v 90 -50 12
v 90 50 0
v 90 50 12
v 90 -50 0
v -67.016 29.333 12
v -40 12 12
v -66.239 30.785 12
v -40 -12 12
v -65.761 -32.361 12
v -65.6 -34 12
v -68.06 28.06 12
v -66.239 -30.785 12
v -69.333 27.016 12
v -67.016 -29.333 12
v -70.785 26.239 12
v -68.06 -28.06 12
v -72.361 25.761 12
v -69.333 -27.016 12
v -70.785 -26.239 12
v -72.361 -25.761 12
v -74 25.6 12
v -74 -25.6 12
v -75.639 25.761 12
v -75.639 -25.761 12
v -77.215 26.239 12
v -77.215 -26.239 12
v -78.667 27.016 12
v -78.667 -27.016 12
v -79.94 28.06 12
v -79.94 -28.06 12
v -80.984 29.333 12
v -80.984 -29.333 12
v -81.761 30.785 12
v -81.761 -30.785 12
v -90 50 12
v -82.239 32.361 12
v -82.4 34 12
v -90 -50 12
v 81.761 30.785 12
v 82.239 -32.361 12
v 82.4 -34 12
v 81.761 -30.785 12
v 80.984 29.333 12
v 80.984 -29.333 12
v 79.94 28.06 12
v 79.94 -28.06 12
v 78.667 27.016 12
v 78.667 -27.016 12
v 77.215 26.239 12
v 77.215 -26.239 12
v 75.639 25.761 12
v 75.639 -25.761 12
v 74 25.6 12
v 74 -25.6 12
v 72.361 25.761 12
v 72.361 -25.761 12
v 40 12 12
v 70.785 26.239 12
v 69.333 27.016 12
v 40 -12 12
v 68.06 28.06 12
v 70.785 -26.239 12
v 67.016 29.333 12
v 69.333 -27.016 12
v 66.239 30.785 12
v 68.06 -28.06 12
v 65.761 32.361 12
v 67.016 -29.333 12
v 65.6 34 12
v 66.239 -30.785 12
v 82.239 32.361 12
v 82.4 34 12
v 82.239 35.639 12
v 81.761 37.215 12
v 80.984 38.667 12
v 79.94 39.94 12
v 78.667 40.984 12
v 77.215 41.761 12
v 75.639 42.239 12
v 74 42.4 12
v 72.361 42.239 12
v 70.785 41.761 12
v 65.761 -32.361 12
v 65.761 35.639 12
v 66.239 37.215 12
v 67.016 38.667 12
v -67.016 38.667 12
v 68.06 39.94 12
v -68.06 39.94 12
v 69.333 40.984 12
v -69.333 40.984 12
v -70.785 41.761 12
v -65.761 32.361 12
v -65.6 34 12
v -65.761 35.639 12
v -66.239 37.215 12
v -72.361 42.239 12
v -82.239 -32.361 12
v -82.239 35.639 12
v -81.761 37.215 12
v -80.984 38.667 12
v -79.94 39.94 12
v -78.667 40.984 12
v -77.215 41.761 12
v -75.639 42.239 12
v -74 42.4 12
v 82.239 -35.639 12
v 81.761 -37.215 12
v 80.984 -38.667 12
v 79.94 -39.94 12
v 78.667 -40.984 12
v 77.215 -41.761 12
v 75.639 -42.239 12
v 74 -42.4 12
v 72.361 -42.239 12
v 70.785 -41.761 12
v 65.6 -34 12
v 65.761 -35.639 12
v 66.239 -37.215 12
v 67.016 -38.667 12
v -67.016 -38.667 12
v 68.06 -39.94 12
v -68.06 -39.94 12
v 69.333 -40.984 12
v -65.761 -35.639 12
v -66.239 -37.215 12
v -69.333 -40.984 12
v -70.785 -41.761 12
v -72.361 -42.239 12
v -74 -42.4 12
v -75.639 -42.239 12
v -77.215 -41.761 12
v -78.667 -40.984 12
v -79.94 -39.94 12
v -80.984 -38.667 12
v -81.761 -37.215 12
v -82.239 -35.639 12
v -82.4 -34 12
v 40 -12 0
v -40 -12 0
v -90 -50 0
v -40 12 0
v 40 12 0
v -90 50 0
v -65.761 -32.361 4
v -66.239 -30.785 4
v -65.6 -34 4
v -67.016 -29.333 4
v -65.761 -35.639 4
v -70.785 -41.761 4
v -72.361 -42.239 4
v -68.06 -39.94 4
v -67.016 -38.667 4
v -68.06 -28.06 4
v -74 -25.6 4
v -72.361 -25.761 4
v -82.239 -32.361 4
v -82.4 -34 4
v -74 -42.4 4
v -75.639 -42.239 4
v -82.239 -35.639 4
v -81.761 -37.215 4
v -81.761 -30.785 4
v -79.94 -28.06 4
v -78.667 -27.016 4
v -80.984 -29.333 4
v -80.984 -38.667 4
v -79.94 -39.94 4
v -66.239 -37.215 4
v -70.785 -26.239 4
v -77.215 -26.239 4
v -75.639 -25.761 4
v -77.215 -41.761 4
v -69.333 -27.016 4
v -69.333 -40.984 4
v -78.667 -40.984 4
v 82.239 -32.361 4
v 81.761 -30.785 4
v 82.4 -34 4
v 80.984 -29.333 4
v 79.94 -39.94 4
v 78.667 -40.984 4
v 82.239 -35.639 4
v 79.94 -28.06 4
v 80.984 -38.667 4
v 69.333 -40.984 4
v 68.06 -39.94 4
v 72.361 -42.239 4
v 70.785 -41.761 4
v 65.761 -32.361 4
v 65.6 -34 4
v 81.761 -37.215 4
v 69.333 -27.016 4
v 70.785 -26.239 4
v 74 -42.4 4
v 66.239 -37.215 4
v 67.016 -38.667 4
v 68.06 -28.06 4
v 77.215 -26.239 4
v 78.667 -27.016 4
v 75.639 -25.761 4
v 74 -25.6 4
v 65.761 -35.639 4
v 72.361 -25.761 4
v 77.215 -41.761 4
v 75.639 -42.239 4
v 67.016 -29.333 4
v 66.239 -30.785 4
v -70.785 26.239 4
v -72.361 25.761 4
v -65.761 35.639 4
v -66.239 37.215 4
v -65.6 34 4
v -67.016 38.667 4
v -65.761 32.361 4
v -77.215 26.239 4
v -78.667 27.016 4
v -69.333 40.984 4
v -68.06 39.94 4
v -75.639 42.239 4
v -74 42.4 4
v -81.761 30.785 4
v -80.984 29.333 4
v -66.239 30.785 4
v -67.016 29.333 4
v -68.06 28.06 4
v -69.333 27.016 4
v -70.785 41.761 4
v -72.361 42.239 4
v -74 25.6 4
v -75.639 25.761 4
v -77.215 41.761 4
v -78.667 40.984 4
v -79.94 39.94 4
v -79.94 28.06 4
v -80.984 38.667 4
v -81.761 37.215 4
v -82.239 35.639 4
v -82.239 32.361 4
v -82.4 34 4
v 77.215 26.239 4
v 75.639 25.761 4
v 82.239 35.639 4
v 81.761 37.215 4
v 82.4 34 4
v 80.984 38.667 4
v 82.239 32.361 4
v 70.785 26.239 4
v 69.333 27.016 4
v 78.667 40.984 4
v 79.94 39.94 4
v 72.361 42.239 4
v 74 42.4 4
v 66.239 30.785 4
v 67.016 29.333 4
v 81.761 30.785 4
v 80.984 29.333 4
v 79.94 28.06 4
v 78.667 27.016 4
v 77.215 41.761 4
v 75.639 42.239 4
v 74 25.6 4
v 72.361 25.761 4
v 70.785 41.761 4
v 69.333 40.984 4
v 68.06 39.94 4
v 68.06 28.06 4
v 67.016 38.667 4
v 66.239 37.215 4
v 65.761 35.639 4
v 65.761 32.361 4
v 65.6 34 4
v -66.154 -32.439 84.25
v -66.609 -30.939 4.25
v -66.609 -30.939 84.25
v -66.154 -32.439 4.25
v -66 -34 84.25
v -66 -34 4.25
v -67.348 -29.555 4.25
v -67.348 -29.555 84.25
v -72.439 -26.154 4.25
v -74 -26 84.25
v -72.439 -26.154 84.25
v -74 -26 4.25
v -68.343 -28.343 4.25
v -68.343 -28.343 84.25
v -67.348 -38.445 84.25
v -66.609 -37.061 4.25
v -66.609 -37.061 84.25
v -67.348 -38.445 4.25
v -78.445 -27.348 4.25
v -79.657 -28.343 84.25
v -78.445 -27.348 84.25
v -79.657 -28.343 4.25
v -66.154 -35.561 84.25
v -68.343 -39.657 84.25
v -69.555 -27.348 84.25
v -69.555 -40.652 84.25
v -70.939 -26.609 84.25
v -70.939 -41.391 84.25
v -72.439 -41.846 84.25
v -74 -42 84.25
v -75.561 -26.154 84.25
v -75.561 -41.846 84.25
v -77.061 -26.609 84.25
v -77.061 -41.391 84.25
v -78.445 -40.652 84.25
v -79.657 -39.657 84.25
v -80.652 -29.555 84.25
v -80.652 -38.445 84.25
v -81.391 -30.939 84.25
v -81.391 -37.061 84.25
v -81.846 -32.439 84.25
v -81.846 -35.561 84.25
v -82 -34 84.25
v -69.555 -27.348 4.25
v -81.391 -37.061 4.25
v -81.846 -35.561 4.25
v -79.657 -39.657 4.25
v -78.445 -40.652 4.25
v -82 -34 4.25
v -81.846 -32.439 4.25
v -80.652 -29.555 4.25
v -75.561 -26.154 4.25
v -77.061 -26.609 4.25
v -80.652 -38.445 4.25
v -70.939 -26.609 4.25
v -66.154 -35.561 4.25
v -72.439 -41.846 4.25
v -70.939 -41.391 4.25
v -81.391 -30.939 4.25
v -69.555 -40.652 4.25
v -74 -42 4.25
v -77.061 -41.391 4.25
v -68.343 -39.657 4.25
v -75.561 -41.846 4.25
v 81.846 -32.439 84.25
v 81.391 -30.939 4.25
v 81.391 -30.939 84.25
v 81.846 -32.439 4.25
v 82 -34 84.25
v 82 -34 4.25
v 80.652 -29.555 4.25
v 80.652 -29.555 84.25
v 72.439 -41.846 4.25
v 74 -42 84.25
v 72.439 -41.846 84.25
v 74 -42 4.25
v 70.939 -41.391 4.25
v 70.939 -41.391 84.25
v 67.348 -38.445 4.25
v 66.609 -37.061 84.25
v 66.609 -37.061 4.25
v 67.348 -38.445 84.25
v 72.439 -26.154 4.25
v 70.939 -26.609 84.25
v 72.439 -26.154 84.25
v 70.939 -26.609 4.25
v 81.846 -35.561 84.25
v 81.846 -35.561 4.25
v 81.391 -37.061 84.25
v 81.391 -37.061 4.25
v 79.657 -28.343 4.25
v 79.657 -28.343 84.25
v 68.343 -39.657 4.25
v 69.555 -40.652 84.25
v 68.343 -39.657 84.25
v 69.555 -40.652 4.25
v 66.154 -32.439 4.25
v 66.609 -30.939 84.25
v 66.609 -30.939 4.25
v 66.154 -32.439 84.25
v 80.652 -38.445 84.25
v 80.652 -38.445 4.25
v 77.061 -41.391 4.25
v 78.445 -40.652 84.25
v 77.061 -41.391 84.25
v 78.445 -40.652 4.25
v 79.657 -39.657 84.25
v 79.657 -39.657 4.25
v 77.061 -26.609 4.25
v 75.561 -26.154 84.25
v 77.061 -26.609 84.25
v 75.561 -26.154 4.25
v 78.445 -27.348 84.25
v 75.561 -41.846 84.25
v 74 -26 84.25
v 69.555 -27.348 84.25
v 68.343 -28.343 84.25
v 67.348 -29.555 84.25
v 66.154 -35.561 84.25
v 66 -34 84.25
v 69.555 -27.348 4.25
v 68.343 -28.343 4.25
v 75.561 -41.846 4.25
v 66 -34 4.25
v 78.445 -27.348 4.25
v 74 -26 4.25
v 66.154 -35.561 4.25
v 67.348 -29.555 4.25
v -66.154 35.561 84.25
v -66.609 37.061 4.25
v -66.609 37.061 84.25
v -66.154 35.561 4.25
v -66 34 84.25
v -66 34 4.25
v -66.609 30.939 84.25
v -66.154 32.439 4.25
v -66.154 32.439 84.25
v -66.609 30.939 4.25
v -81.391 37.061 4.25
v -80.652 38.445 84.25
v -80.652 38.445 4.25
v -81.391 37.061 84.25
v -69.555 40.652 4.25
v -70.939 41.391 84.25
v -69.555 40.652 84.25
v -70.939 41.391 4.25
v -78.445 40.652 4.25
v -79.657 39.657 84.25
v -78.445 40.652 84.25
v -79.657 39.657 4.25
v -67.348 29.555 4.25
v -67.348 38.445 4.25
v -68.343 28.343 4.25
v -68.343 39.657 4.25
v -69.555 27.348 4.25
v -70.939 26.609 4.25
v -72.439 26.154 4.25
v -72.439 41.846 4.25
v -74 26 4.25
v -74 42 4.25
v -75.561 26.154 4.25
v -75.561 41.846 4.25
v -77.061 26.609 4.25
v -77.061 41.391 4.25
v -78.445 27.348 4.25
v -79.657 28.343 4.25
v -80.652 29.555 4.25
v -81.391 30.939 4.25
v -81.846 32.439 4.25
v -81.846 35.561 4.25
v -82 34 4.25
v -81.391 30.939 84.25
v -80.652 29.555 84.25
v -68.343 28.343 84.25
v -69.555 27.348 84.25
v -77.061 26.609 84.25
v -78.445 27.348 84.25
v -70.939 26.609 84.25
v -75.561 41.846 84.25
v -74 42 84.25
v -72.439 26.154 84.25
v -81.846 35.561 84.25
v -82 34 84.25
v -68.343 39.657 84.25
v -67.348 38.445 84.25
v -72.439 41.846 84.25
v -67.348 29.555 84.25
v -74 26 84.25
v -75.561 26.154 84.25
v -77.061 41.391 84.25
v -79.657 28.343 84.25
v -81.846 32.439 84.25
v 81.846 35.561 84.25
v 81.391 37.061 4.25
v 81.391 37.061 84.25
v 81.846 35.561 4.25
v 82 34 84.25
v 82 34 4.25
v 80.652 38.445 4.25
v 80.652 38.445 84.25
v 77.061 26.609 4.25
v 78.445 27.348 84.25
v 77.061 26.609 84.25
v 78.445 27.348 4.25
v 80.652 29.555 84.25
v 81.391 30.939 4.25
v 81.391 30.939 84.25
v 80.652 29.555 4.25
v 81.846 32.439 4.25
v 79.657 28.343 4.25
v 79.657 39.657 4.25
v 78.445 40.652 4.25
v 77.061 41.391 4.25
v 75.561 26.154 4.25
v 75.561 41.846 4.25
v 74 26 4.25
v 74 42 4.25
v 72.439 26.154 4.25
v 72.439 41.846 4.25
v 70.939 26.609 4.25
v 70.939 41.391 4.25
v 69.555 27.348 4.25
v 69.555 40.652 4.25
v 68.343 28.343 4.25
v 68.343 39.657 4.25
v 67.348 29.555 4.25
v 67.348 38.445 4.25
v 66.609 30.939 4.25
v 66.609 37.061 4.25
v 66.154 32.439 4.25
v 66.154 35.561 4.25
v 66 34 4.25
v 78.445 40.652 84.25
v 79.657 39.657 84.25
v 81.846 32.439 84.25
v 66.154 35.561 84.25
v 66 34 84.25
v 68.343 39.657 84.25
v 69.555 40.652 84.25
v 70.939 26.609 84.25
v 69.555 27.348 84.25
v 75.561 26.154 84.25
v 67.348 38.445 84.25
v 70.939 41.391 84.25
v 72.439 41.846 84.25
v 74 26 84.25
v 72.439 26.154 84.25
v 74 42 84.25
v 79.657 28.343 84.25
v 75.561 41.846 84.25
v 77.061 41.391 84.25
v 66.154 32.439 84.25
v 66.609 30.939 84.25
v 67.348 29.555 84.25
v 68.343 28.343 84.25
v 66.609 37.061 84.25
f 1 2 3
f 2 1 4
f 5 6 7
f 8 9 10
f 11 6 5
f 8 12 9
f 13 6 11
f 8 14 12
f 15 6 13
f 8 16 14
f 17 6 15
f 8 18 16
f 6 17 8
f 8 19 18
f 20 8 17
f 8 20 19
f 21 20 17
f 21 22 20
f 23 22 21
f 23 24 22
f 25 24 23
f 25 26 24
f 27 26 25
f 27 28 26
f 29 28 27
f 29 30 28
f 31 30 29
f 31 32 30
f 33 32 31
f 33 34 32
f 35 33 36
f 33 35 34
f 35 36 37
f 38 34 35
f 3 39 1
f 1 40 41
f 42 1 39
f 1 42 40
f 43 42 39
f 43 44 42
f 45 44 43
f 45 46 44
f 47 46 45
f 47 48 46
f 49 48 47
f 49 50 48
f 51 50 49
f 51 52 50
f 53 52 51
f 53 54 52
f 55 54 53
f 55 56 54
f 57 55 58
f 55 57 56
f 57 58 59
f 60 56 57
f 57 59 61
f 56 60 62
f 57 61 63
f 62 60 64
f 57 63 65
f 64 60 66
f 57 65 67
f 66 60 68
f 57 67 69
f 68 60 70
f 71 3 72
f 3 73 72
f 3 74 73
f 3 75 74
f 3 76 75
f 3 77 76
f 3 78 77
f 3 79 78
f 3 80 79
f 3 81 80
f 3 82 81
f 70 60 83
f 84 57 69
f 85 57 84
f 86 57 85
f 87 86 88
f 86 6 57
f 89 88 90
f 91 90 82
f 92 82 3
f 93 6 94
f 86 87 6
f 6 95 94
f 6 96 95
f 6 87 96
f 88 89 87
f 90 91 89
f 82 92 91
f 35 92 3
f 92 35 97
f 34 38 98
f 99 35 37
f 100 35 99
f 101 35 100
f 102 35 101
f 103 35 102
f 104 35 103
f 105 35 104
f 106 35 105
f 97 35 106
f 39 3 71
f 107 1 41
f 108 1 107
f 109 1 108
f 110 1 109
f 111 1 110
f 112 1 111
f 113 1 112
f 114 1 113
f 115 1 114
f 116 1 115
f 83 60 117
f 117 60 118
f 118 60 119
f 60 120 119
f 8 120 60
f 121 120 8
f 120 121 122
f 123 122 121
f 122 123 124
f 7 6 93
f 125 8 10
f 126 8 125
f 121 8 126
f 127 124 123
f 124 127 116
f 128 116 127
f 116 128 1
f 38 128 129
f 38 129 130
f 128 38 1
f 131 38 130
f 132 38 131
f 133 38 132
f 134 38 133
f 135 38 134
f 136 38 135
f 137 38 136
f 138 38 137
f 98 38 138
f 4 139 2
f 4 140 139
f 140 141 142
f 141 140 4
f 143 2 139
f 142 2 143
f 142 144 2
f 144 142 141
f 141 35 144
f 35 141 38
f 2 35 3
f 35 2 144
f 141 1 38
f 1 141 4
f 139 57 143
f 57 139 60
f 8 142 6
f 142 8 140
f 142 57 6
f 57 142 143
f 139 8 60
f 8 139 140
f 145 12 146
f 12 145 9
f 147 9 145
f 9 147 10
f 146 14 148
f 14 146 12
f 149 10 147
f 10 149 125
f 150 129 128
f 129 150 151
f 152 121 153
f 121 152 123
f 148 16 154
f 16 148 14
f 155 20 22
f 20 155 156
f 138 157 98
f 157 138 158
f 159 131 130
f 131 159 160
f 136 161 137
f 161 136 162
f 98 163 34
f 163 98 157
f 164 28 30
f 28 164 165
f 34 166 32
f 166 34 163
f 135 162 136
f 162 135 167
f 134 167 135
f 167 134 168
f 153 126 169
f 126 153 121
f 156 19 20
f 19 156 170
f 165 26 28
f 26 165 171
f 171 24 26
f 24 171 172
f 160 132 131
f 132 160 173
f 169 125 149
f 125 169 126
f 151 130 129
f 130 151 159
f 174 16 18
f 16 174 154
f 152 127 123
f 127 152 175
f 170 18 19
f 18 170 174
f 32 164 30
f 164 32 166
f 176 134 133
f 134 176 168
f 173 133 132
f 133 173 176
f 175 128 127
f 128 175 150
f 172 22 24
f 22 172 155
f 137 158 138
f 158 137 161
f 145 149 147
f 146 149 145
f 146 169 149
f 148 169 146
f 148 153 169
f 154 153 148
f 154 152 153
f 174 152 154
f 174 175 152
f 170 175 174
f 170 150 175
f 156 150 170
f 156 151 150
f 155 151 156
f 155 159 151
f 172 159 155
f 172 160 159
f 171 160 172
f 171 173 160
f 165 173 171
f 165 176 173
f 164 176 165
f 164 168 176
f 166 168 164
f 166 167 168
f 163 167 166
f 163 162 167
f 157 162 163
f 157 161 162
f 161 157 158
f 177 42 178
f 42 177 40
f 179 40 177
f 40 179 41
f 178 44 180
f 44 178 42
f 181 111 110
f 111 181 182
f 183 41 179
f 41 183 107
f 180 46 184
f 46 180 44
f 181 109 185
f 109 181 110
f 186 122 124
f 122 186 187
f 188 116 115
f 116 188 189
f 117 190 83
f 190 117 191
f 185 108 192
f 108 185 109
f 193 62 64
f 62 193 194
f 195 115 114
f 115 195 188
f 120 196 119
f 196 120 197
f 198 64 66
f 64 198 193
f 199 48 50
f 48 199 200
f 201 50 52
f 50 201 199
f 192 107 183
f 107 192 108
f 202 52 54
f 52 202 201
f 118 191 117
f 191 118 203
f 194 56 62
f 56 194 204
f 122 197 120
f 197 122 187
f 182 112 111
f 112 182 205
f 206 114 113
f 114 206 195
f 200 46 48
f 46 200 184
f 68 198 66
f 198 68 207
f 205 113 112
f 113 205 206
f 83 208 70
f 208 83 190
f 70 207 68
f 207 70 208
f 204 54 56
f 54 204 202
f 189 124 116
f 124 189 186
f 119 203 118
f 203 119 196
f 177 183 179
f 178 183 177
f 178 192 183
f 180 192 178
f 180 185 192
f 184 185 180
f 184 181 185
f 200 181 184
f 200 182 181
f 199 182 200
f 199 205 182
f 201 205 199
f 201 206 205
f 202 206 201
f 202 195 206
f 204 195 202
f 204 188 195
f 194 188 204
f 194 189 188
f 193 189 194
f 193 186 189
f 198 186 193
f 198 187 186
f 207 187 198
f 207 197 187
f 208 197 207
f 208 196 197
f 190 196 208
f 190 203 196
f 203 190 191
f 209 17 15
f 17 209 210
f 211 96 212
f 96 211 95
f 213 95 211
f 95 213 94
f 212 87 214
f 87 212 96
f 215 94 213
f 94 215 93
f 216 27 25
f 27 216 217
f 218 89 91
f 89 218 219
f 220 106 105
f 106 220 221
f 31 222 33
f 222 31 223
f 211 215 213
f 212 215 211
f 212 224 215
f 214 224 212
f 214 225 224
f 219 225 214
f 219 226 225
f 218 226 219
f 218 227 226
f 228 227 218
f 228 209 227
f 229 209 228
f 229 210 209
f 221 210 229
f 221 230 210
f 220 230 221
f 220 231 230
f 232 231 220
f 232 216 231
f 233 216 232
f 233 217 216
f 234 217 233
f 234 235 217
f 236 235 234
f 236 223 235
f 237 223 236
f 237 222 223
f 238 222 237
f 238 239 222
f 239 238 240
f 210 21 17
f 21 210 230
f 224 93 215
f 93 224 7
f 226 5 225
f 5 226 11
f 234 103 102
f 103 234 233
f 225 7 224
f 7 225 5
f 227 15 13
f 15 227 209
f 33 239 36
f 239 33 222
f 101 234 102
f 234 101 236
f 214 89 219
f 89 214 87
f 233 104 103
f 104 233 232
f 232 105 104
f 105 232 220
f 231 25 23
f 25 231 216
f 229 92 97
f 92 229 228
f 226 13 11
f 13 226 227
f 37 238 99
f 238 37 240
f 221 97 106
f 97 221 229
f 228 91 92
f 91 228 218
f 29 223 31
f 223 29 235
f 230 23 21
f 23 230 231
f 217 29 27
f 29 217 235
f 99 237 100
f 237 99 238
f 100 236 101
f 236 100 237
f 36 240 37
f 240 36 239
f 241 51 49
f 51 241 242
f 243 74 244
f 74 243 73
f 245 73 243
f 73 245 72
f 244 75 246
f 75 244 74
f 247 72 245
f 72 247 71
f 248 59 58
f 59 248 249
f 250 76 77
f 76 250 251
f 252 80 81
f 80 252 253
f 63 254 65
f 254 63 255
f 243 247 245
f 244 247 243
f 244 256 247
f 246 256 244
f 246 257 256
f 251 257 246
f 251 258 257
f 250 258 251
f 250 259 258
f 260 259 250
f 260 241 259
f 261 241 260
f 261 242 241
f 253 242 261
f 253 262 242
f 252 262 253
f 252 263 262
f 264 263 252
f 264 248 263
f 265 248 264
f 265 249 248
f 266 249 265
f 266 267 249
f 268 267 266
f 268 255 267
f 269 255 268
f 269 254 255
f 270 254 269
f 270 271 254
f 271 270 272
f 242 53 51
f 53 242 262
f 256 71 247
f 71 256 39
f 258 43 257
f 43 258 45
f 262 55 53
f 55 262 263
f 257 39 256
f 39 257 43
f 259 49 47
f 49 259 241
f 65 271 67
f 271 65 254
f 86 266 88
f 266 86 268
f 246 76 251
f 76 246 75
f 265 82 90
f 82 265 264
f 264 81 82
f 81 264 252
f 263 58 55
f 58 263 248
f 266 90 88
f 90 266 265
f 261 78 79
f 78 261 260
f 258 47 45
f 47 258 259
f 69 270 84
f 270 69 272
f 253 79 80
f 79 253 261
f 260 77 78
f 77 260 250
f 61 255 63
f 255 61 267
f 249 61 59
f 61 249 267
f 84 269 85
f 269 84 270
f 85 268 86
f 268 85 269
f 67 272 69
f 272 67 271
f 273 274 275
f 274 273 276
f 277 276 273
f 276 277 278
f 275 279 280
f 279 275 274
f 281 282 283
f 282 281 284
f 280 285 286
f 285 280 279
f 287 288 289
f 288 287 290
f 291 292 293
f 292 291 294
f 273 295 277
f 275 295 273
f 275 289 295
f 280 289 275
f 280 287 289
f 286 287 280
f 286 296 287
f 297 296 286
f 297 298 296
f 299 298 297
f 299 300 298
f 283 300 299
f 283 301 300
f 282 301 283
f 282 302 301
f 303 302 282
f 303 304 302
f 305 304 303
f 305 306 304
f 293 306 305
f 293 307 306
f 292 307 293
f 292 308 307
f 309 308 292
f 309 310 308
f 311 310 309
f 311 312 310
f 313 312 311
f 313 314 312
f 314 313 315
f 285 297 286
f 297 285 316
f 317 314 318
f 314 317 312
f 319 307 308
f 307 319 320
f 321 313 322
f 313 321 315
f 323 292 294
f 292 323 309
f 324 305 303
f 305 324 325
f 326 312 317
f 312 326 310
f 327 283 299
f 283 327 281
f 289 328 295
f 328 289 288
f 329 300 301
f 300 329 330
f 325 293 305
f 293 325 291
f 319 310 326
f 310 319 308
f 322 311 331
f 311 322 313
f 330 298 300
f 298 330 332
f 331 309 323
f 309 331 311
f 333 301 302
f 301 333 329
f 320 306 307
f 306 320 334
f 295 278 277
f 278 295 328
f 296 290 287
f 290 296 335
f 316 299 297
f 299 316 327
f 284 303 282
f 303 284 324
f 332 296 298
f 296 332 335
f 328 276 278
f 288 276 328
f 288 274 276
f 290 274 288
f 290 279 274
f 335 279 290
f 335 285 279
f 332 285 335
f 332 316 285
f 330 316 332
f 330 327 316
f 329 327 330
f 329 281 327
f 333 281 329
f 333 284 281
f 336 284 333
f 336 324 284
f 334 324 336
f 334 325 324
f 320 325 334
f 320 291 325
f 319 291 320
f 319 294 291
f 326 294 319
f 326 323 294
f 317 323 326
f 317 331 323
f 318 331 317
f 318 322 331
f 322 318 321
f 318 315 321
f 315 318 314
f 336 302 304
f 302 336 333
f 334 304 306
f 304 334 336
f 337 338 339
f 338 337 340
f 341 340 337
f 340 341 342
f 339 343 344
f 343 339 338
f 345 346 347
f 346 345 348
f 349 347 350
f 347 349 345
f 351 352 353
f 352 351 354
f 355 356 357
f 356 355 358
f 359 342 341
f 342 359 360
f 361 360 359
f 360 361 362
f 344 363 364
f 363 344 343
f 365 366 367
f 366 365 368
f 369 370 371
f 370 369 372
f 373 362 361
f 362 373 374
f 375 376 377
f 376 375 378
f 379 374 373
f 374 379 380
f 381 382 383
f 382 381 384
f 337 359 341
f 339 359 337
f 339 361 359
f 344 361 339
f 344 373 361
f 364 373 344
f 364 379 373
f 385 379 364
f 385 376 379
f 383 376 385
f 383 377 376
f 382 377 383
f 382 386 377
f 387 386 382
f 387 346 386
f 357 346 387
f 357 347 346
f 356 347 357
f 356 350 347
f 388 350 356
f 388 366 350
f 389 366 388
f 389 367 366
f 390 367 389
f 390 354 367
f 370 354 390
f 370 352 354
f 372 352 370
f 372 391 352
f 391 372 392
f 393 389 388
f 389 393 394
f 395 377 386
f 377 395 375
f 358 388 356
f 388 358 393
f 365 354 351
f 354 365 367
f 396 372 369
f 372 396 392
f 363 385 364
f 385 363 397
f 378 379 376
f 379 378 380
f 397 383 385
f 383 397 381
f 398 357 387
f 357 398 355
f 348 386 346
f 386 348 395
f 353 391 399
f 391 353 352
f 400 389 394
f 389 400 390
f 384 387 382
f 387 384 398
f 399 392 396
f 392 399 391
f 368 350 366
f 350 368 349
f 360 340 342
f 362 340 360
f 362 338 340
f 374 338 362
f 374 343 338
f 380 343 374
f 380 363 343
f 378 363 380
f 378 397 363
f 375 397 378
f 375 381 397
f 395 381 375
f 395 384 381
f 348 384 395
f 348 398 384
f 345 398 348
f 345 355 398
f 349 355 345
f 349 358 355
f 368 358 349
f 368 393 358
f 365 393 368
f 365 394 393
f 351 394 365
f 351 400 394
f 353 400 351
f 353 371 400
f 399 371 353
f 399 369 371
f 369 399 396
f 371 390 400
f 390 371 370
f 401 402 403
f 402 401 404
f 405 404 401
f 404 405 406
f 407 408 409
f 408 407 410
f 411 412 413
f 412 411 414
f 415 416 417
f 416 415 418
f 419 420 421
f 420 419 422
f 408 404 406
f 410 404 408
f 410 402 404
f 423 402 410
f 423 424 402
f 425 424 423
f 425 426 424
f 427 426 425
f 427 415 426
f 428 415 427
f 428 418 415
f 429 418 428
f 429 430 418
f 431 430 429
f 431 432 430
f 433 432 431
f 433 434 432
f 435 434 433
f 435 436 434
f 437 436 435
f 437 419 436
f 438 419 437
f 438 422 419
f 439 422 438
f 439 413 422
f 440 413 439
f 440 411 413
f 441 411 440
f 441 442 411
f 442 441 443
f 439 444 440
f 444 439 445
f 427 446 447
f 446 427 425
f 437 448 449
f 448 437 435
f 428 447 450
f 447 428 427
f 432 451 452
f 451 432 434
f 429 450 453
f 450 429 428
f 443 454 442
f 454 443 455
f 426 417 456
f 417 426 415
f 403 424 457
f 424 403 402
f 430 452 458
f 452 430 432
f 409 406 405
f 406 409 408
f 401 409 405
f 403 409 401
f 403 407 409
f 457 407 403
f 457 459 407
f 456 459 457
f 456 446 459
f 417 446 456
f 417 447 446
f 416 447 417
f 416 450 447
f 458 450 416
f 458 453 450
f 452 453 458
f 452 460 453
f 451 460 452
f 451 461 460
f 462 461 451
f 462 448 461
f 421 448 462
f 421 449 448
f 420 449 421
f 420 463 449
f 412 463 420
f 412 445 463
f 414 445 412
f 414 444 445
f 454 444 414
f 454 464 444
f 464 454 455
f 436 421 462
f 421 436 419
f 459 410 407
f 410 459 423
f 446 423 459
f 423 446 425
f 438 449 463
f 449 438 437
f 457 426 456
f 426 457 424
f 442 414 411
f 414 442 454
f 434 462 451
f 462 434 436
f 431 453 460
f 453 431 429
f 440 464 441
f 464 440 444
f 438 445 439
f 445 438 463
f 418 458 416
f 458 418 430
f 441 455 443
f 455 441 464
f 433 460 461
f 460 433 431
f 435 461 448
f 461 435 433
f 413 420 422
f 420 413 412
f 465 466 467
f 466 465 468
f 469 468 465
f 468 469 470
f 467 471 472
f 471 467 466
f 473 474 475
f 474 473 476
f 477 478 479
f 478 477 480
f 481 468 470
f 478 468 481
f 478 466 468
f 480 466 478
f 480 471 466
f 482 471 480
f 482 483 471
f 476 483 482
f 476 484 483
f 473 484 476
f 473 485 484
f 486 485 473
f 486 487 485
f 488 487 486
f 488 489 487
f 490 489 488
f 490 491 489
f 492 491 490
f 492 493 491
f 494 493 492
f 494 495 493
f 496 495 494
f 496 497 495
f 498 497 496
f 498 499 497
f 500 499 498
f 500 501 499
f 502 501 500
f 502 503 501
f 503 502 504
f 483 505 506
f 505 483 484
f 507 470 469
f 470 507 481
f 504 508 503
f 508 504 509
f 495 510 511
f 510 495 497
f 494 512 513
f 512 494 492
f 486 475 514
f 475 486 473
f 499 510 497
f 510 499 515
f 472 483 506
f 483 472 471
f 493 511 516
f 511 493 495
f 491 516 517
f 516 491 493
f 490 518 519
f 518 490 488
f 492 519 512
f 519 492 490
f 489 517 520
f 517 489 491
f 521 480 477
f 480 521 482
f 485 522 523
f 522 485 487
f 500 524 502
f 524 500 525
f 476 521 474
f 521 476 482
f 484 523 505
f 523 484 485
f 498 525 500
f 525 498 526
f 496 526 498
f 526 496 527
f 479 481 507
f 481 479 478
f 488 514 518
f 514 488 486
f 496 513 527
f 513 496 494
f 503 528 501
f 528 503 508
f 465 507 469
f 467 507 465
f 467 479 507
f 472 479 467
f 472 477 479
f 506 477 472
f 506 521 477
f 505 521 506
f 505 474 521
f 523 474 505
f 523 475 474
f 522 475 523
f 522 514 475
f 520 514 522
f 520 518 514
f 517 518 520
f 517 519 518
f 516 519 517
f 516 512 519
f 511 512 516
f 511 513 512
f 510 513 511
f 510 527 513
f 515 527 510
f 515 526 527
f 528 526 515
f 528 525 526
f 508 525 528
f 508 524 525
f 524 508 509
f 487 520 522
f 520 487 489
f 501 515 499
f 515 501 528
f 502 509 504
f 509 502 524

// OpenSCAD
$fn = 32;

// ------------------------------------------------------------------------
// Frame with four posts: 180 x 100 mm frame, four d16 posts
// Every part is its own module, assembly() places them once.
// ------------------------------------------------------------------------

// --- part 1 ---
module base_frame() {
  difference() {
    translate([-90, -50, 0]) cube([180, 100, 12]);
    translate([-40, -12, -1]) cube([80, 24, 14]);
    translate([-74, -34, 4]) cylinder(h = 9, d = 16.8);
    translate([74, -34, 4]) cylinder(h = 9, d = 16.8);
    translate([-74, 34, 4]) cylinder(h = 9, d = 16.8);
    translate([74, 34, 4]) cylinder(h = 9, d = 16.8);
  }
}

// --- part 2 ---
module post1() {
  cylinder(h = 80, d = 16);
}

// --- part 3 ---
module post2() {
  cylinder(h = 80, d = 16);
}

// --- part 4 ---
module post3() {
  cylinder(h = 80, d = 16);
}

// --- part 5 ---
module post4() {
  cylinder(h = 80, d = 16);
}

// --- assembly ---
module assembly() {
  translate([0, 0, 0]) rotate([0, 0, 0]) base_frame();
  translate([-74, -34, 4.25]) rotate([0, 0, 0]) post1();
  translate([74, -34, 4.25]) rotate([0, 0, 0]) post2();
  translate([-74, 34, 4.25]) rotate([0, 0, 0]) post3();
  translate([74, 34, 4.25]) rotate([0, 0, 0]) post4();
}

assembly();
